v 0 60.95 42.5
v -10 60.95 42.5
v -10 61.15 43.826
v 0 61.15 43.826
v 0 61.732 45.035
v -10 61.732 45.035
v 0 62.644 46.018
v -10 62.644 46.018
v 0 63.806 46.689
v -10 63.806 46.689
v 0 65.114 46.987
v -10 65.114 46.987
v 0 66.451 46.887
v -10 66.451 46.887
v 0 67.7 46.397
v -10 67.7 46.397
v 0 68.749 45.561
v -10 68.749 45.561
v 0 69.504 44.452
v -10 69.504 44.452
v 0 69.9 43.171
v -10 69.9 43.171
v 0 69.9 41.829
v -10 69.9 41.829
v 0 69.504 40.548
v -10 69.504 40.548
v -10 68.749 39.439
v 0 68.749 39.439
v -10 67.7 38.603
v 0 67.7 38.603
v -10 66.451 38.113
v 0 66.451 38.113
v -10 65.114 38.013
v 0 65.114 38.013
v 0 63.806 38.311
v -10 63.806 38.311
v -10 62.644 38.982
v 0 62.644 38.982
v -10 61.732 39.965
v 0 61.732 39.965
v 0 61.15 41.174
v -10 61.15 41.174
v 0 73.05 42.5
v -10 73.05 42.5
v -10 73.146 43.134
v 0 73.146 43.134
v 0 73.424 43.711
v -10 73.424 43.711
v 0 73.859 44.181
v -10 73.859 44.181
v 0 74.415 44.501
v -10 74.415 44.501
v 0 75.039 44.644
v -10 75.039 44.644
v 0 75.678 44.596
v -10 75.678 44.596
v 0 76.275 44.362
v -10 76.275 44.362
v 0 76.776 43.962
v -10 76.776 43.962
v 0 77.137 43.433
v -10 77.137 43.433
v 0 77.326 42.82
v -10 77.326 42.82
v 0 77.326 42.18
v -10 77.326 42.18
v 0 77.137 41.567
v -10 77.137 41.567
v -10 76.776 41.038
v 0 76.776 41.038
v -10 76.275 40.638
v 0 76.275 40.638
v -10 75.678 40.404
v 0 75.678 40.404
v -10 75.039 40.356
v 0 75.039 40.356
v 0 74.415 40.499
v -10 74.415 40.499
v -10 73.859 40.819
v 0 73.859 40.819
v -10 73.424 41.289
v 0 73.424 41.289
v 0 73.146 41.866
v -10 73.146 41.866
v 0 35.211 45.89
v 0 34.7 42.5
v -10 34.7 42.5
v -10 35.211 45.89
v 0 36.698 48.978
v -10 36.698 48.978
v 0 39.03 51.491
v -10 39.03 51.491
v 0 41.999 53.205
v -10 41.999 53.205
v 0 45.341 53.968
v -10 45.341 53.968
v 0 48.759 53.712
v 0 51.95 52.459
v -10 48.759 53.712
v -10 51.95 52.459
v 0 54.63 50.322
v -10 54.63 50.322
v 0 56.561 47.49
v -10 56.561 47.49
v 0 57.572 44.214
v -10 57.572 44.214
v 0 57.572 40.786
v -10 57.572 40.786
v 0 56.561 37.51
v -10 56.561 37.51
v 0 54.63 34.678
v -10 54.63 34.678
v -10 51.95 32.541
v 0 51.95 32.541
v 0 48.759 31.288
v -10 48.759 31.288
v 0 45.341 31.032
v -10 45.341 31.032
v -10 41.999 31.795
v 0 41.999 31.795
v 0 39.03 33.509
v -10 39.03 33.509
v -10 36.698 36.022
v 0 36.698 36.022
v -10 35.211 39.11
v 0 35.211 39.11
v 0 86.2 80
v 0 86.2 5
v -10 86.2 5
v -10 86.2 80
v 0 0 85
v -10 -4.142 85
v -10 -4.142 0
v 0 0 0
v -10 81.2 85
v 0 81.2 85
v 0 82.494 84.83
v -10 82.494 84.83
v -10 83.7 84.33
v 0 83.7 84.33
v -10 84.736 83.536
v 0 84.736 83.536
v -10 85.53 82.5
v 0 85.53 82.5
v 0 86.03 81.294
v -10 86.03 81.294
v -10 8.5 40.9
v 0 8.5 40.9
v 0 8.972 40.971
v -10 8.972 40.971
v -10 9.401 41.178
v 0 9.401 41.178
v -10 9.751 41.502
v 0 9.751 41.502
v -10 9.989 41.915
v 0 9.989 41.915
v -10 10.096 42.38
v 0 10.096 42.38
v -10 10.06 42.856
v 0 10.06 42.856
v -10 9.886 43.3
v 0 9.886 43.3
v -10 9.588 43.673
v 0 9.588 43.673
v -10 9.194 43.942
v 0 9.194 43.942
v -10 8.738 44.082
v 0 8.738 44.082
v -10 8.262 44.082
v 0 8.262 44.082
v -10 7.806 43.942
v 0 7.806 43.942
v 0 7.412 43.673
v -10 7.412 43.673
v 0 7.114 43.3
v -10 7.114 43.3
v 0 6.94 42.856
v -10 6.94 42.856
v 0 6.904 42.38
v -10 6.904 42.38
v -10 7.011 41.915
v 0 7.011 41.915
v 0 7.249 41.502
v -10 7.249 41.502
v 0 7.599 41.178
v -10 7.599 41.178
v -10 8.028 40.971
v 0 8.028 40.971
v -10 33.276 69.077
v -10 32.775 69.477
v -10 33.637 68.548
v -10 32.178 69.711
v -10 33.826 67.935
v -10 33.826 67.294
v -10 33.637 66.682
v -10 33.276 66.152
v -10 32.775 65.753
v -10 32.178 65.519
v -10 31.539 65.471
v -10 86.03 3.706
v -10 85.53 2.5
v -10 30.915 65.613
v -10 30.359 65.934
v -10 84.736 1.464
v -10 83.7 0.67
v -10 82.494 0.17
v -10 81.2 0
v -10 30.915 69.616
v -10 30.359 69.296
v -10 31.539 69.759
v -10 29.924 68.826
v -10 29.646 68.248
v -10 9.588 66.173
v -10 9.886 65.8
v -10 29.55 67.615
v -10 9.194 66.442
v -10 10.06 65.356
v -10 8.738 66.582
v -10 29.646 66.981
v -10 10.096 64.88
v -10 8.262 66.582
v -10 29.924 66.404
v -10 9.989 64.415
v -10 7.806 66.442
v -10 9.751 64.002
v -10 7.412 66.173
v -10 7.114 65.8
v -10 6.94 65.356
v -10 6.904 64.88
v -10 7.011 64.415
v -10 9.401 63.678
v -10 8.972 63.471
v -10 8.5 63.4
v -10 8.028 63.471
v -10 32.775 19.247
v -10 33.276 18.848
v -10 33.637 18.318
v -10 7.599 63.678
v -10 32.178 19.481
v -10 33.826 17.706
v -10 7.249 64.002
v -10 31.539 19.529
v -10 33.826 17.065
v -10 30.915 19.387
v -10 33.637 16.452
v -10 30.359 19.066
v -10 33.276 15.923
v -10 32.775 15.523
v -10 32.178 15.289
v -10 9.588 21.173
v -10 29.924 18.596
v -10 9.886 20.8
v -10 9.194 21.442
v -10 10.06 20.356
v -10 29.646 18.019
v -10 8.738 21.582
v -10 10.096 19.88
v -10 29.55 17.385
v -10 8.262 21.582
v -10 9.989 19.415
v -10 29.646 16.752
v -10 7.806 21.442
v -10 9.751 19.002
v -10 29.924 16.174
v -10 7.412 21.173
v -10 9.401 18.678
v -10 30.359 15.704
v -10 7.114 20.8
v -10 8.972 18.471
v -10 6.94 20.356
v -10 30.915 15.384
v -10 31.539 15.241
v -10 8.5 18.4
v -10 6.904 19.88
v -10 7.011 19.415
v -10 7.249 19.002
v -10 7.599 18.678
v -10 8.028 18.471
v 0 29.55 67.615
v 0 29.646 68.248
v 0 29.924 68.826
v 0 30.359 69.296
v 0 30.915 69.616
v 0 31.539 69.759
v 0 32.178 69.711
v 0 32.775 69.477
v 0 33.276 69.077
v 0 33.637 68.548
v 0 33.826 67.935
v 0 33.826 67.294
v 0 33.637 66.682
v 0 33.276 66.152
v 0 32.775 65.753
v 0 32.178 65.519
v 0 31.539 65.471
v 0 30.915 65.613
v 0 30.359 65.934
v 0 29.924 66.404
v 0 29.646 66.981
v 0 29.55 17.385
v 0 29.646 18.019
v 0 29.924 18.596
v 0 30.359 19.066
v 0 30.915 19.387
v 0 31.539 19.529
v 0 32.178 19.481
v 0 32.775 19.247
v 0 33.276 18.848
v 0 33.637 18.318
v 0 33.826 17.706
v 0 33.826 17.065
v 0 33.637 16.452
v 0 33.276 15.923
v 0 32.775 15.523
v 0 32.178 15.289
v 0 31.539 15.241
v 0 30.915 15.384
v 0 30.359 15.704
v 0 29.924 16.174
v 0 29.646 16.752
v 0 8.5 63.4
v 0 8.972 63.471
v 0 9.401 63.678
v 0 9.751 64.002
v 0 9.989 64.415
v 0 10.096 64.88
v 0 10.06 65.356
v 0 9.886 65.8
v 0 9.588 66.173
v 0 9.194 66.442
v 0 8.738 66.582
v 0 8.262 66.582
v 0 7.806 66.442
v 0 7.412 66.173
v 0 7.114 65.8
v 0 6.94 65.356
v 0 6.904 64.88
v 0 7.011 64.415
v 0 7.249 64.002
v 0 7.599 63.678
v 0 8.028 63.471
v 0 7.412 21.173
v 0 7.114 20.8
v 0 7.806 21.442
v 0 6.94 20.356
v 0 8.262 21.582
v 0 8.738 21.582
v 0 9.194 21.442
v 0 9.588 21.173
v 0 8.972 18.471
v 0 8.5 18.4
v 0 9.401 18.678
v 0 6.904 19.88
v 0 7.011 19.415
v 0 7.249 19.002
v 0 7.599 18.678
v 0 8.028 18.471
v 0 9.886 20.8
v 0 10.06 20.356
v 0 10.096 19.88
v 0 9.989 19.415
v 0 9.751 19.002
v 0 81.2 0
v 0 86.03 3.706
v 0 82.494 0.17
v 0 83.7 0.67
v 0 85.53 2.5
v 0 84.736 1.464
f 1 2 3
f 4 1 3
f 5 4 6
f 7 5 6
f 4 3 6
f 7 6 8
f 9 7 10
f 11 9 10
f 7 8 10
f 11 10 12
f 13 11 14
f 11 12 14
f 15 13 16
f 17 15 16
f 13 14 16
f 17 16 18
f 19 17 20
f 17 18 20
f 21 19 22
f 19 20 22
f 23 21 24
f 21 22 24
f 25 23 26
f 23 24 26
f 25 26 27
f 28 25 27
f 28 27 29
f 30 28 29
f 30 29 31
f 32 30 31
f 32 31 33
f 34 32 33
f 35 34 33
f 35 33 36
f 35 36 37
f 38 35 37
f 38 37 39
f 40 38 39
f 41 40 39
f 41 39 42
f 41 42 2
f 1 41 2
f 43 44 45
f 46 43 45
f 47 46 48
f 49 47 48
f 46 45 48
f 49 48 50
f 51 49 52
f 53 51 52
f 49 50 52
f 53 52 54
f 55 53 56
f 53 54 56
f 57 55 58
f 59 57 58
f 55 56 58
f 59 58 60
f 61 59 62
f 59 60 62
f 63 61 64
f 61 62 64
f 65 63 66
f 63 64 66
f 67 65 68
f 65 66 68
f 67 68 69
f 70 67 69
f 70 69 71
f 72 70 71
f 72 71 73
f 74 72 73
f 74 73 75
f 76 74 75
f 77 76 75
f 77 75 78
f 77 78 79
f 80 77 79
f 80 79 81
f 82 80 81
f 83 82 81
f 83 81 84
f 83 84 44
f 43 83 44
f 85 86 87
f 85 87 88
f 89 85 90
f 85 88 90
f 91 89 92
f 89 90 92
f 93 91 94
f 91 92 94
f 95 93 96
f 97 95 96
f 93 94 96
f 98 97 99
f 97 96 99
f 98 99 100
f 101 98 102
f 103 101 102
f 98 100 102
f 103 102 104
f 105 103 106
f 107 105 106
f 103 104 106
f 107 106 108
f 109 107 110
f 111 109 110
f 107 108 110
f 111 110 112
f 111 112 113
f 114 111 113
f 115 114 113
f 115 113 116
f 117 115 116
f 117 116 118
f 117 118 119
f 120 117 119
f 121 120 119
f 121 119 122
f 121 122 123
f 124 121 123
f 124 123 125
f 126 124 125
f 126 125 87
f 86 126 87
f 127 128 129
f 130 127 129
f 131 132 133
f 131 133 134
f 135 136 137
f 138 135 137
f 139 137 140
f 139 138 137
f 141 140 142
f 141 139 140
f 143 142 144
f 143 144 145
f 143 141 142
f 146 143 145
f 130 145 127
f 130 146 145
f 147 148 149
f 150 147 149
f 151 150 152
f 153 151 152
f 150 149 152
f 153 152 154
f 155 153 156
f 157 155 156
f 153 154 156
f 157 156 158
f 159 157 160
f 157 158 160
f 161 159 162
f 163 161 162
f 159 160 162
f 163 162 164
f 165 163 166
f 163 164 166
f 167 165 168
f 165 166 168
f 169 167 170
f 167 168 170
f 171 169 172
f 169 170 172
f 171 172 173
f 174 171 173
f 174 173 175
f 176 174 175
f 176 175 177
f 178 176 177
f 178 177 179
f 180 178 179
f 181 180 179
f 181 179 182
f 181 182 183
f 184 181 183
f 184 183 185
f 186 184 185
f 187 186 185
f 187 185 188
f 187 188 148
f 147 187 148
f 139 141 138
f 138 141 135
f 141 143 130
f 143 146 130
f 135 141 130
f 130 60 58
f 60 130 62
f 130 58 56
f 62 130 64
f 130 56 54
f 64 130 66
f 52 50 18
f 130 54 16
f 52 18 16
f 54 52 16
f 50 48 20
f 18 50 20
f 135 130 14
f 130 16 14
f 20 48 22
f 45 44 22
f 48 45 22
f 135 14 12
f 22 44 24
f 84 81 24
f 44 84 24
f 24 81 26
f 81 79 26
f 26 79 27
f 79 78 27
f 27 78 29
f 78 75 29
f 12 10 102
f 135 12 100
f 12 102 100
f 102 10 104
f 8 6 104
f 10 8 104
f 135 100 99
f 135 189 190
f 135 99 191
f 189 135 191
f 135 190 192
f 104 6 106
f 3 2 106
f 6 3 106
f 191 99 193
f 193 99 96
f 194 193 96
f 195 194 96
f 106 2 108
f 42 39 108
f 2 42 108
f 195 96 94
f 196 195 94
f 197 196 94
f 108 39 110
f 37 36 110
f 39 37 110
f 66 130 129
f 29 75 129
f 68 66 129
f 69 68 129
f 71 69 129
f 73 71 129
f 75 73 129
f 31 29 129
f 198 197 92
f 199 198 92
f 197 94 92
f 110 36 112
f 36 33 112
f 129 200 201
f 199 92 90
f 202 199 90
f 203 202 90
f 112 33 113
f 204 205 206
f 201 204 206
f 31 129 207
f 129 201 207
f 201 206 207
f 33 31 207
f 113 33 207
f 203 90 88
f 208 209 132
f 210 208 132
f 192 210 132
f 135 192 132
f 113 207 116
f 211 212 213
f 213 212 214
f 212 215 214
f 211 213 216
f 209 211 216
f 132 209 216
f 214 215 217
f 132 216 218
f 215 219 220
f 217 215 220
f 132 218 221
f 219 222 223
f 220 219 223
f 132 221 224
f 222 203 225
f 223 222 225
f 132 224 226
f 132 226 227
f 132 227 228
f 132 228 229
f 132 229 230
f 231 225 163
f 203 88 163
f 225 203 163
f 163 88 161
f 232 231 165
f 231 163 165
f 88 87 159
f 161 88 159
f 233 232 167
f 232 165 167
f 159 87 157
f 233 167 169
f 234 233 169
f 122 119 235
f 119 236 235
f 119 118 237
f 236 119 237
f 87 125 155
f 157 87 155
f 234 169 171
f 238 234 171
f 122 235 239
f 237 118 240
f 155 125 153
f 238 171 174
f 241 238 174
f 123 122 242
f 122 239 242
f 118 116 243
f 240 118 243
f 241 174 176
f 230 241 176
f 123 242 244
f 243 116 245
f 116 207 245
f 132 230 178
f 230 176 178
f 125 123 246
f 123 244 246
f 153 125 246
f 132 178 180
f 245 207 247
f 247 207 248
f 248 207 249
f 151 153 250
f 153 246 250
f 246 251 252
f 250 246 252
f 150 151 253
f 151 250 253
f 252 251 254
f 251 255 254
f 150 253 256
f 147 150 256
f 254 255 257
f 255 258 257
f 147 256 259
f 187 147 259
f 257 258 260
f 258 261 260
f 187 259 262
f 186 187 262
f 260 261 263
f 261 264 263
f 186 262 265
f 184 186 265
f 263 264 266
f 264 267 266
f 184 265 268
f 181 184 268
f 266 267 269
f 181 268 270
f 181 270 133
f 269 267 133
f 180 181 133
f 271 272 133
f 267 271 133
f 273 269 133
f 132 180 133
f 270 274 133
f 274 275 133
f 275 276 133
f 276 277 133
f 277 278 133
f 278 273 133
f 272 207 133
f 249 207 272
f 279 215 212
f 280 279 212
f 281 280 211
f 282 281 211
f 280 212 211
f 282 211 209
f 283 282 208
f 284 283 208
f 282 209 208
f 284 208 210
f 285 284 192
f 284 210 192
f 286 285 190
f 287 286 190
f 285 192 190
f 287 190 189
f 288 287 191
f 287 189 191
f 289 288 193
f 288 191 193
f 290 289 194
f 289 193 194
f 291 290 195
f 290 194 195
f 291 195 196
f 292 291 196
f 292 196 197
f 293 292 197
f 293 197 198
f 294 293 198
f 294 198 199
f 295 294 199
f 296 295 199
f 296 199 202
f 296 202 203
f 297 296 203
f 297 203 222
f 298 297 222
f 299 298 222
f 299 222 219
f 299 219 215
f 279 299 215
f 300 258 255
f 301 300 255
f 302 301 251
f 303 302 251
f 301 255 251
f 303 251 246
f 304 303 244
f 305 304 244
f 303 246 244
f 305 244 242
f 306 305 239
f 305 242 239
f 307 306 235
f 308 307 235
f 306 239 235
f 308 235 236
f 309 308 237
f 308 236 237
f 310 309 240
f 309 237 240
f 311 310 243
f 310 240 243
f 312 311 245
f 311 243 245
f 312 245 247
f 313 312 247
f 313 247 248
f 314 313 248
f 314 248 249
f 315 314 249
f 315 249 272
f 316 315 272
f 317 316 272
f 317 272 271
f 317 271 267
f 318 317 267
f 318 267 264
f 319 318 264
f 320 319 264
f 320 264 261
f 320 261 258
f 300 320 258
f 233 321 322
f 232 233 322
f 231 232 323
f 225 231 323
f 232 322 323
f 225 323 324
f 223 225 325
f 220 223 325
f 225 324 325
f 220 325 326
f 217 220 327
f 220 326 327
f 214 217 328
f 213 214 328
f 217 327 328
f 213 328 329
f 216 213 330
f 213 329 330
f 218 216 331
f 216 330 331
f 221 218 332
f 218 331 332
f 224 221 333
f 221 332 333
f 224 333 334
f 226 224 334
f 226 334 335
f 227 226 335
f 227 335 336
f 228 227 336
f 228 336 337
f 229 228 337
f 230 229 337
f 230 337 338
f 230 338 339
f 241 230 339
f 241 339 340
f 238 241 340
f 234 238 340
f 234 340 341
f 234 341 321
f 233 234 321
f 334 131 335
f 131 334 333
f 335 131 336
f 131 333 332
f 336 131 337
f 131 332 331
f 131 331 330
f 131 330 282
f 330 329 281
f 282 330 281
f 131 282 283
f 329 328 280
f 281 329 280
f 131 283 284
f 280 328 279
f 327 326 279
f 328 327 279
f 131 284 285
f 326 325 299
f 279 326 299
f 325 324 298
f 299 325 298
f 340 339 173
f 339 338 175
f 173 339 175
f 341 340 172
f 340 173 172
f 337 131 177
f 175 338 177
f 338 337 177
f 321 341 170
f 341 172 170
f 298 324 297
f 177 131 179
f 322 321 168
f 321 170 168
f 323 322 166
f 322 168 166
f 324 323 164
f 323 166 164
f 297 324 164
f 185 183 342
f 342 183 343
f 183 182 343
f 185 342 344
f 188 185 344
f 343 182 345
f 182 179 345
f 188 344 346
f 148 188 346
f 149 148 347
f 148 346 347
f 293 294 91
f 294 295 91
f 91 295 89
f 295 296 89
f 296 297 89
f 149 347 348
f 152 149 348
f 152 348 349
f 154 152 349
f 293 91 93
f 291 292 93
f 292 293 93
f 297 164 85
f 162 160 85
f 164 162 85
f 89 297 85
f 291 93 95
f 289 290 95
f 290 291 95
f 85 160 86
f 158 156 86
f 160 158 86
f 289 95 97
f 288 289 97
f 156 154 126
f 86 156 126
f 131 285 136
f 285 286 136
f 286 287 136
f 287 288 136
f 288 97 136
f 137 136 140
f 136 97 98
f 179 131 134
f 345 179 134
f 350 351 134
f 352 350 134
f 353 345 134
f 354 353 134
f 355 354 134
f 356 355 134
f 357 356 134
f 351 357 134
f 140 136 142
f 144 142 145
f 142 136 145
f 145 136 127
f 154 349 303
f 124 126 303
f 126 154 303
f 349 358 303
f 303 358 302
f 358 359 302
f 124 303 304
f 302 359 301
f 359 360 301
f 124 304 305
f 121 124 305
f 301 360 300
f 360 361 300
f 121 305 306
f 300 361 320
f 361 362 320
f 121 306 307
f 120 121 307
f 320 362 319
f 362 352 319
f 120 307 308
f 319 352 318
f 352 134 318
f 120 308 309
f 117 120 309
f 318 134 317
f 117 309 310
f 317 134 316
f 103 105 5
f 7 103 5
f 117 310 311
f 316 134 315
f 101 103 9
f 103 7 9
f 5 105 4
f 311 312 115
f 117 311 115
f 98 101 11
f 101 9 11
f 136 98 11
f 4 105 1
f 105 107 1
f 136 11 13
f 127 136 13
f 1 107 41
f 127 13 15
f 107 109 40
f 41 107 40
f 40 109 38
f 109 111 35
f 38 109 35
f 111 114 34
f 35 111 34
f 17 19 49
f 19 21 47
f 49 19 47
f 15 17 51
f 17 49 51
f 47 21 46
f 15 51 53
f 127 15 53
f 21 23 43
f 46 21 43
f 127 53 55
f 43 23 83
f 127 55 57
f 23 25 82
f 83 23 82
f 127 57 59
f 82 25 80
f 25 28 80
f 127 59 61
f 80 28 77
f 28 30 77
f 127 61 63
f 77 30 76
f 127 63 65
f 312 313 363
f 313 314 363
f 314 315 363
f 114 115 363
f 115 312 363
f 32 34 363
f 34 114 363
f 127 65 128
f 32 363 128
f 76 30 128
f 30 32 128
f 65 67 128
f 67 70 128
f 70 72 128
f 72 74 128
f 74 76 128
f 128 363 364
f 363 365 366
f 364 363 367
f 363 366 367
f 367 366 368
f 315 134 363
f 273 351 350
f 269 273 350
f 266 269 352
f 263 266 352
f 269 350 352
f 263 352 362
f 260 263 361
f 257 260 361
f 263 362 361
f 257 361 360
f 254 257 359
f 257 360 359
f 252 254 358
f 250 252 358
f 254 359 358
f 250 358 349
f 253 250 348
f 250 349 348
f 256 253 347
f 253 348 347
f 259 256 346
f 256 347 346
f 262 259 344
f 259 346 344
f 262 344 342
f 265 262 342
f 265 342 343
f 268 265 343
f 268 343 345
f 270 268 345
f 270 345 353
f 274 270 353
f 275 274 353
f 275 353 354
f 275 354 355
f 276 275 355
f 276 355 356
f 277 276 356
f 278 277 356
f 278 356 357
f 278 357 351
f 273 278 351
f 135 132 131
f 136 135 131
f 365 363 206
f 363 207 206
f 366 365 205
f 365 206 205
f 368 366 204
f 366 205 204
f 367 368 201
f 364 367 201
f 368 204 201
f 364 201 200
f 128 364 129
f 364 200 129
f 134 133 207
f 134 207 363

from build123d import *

# Parameters (mm, degrees)
BOSS_EXTRUDE1_DEPTH = 85
SKETCH3_R           = 11.5
SKETCH3_R_2         = 4.5
SKETCH3_R_3         = 2.15
CUT_EXTRUDE1_DEPTH  = 85
SKETCH4_R           = 1.6
CUT_EXTRUDE2_DEPTH  = 85
FILLET1_R           = 5


with BuildPart() as part:
    # Sketch2 → Boss-Extrude1 (new body)
    with BuildSketch(Plane.XY):
        Polygon((0, 0), (0, 86.2), (-10, 86.2), (-10, -4.142135624), align=None)
    extrude(amount=BOSS_EXTRUDE1_DEPTH)

    # Sketch3 → Cut-Extrude1 (cut)
    with BuildSketch(Plane.ZY.offset(10)):
        with Locations(Location((42.5, 46.2, 0), (0, 0, 270))):
            Circle(SKETCH3_R)
        with Locations(Location((42.5, 65.45, 0), (0, 0, 270))):
            Circle(SKETCH3_R_2)
        with Locations(Location((42.5, 75.2, 0), (0, 0, 270))):
            Circle(SKETCH3_R_3)
        with Locations(Location((67.61473671, 31.7, 0), (0, 0, 270))):
            Circle(SKETCH3_R_3)
        with Locations(Location((17.38526329, 31.7, 0), (0, 0, 270))):
            Circle(SKETCH3_R_3)
    extrude(amount=-CUT_EXTRUDE1_DEPTH, mode=Mode.SUBTRACT)

    # Sketch4 → Cut-Extrude2 (cut)
    with BuildSketch(Plane(origin=(0, 0, 0), x_dir=(0, 0, -1), z_dir=(1, 0, 0))):
        with Locations((-65, 8.5)):
            Circle(SKETCH4_R)
        with Locations((-20, 8.5)):
            Circle(SKETCH4_R)
        with Locations((-42.5, 8.5)):
            Circle(SKETCH4_R)
    extrude(amount=-CUT_EXTRUDE2_DEPTH, mode=Mode.SUBTRACT)

    # Fillet1
    fillet1_edges = [part.edges().sort_by_distance(p)[0] for p in [
        (-5, 86.2, 85),
        (-5, 86.2, 0),
    ]]
    fillet(fillet1_edges, radius=FILLET1_R)


solid = part.part
